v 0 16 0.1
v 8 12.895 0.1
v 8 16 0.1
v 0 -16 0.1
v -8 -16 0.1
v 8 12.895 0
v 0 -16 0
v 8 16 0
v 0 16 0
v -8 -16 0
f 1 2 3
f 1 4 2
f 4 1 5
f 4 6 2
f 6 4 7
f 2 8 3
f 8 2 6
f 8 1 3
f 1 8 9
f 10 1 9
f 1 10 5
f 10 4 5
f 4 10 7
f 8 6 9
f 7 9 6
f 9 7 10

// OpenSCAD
// file: 168335i.scad
use <../lib.scad>
function ldraw_lib__168335i() = [
// 0 Sticker  4.0 x  1.0 Diagonal Stripe Up Left
// 0 Name: 168335i.dat
// 0 Author: Ulrich Röder [UR]
// 0 !LDRAW_ORG Part UPDATE 2018-02
// 0 !LICENSE Licensed under CC BY 2.0 and CC BY 4.0 : see CAreadme.txt
// 
// 0 BFC CERTIFY CCW
  [0,"BFC","CERTIFY"],
  [0,"BFC","CCW"],
// 
// 0 !KEYWORDS Set 5591
// 
// 0 !HISTORY 2018-12-08 [PTadmin] Official Update 2018-02
// 
// 
// 3 0 -20 -0.25 40 -20 -0.25 32.237 0 -0.25 40
  [3,0,-20,-0.25,40,-20,-0.25,32.237,0,-0.25,40],
// 4 0 0 -0.25 40 -20 -0.25 32.237 0 -0.25 -40 20 -0.25 -40
  [4,0,0,-0.25,40,-20,-0.25,32.237,0,-0.25,-40,20,-0.25,-40],
// 4 16 0 -0.25 -40 -20 -0.25 32.237 -20 0 32.237 0 0 -40
  [4,16,0,-0.25,-40,-20,-0.25,32.237,-20,0,32.237,0,0,-40],
// 4 16 -20 -0.25 32.237 -20 -0.25 40 -20 0 40 -20 0 32.237
  [4,16,-20,-0.25,32.237,-20,-0.25,40,-20,0,40,-20,0,32.237],
// 4 16 -20 -0.25 40 0 -0.25 40 0 0 40 -20 0 40
  [4,16,-20,-0.25,40,0,-0.25,40,0,0,40,-20,0,40],
// 4 16 0 -0.25 40 20 -0.25 -40 20 0 -40 0 0 40
  [4,16,0,-0.25,40,20,-0.25,-40,20,0,-40,0,0,40],
// 4 16 20 -0.25 -40 0 -0.25 -40 0 0 -40 20 0 -40
  [4,16,20,-0.25,-40,0,-0.25,-40,0,0,-40,20,0,-40],
// 3 16 0 0 40 -20 0 32.237 -20 0 40
  [3,16,0,0,40,-20,0,32.237,-20,0,40],
// 4 16 20 0 -40 0 0 -40 -20 0 32.237 0 0 40
  [4,16,20,0,-40,0,0,-40,-20,0,32.237,0,0,40],
];
makepoly(ldraw_lib__168335i(), line=0.2);
// main file
use <../lib.scad>
use <168335i.scad>
function ldraw_lib__168335j() = [
// 0 Sticker  4.0 x  1.0 Diagonal Stripe Up Right
// 0 Name: 168335j.dat
// 0 Author: Ulrich Röder [UR]
// 0 !LDRAW_ORG Part UPDATE 2018-02
// 0 !LICENSE Licensed under CC BY 2.0 and CC BY 4.0 : see CAreadme.txt
// 
// 0 BFC CERTIFY CCW
  [0,"BFC","CERTIFY"],
  [0,"BFC","CCW"],
// 
// 0 !KEYWORDS Set 5591
// 
// 0 !HISTORY 2018-12-08 [PTadmin] Official Update 2018-02
// 
// 
// 1 16 0 0 0 -1 0 0 0 1 0 0 0 1 168335i.dat
  [1,16,0,0,0,-1,0,0,0,1,0,0,0,1, ldraw_lib__168335i()],
];
makepoly(ldraw_lib__168335j(), line=0.2);
